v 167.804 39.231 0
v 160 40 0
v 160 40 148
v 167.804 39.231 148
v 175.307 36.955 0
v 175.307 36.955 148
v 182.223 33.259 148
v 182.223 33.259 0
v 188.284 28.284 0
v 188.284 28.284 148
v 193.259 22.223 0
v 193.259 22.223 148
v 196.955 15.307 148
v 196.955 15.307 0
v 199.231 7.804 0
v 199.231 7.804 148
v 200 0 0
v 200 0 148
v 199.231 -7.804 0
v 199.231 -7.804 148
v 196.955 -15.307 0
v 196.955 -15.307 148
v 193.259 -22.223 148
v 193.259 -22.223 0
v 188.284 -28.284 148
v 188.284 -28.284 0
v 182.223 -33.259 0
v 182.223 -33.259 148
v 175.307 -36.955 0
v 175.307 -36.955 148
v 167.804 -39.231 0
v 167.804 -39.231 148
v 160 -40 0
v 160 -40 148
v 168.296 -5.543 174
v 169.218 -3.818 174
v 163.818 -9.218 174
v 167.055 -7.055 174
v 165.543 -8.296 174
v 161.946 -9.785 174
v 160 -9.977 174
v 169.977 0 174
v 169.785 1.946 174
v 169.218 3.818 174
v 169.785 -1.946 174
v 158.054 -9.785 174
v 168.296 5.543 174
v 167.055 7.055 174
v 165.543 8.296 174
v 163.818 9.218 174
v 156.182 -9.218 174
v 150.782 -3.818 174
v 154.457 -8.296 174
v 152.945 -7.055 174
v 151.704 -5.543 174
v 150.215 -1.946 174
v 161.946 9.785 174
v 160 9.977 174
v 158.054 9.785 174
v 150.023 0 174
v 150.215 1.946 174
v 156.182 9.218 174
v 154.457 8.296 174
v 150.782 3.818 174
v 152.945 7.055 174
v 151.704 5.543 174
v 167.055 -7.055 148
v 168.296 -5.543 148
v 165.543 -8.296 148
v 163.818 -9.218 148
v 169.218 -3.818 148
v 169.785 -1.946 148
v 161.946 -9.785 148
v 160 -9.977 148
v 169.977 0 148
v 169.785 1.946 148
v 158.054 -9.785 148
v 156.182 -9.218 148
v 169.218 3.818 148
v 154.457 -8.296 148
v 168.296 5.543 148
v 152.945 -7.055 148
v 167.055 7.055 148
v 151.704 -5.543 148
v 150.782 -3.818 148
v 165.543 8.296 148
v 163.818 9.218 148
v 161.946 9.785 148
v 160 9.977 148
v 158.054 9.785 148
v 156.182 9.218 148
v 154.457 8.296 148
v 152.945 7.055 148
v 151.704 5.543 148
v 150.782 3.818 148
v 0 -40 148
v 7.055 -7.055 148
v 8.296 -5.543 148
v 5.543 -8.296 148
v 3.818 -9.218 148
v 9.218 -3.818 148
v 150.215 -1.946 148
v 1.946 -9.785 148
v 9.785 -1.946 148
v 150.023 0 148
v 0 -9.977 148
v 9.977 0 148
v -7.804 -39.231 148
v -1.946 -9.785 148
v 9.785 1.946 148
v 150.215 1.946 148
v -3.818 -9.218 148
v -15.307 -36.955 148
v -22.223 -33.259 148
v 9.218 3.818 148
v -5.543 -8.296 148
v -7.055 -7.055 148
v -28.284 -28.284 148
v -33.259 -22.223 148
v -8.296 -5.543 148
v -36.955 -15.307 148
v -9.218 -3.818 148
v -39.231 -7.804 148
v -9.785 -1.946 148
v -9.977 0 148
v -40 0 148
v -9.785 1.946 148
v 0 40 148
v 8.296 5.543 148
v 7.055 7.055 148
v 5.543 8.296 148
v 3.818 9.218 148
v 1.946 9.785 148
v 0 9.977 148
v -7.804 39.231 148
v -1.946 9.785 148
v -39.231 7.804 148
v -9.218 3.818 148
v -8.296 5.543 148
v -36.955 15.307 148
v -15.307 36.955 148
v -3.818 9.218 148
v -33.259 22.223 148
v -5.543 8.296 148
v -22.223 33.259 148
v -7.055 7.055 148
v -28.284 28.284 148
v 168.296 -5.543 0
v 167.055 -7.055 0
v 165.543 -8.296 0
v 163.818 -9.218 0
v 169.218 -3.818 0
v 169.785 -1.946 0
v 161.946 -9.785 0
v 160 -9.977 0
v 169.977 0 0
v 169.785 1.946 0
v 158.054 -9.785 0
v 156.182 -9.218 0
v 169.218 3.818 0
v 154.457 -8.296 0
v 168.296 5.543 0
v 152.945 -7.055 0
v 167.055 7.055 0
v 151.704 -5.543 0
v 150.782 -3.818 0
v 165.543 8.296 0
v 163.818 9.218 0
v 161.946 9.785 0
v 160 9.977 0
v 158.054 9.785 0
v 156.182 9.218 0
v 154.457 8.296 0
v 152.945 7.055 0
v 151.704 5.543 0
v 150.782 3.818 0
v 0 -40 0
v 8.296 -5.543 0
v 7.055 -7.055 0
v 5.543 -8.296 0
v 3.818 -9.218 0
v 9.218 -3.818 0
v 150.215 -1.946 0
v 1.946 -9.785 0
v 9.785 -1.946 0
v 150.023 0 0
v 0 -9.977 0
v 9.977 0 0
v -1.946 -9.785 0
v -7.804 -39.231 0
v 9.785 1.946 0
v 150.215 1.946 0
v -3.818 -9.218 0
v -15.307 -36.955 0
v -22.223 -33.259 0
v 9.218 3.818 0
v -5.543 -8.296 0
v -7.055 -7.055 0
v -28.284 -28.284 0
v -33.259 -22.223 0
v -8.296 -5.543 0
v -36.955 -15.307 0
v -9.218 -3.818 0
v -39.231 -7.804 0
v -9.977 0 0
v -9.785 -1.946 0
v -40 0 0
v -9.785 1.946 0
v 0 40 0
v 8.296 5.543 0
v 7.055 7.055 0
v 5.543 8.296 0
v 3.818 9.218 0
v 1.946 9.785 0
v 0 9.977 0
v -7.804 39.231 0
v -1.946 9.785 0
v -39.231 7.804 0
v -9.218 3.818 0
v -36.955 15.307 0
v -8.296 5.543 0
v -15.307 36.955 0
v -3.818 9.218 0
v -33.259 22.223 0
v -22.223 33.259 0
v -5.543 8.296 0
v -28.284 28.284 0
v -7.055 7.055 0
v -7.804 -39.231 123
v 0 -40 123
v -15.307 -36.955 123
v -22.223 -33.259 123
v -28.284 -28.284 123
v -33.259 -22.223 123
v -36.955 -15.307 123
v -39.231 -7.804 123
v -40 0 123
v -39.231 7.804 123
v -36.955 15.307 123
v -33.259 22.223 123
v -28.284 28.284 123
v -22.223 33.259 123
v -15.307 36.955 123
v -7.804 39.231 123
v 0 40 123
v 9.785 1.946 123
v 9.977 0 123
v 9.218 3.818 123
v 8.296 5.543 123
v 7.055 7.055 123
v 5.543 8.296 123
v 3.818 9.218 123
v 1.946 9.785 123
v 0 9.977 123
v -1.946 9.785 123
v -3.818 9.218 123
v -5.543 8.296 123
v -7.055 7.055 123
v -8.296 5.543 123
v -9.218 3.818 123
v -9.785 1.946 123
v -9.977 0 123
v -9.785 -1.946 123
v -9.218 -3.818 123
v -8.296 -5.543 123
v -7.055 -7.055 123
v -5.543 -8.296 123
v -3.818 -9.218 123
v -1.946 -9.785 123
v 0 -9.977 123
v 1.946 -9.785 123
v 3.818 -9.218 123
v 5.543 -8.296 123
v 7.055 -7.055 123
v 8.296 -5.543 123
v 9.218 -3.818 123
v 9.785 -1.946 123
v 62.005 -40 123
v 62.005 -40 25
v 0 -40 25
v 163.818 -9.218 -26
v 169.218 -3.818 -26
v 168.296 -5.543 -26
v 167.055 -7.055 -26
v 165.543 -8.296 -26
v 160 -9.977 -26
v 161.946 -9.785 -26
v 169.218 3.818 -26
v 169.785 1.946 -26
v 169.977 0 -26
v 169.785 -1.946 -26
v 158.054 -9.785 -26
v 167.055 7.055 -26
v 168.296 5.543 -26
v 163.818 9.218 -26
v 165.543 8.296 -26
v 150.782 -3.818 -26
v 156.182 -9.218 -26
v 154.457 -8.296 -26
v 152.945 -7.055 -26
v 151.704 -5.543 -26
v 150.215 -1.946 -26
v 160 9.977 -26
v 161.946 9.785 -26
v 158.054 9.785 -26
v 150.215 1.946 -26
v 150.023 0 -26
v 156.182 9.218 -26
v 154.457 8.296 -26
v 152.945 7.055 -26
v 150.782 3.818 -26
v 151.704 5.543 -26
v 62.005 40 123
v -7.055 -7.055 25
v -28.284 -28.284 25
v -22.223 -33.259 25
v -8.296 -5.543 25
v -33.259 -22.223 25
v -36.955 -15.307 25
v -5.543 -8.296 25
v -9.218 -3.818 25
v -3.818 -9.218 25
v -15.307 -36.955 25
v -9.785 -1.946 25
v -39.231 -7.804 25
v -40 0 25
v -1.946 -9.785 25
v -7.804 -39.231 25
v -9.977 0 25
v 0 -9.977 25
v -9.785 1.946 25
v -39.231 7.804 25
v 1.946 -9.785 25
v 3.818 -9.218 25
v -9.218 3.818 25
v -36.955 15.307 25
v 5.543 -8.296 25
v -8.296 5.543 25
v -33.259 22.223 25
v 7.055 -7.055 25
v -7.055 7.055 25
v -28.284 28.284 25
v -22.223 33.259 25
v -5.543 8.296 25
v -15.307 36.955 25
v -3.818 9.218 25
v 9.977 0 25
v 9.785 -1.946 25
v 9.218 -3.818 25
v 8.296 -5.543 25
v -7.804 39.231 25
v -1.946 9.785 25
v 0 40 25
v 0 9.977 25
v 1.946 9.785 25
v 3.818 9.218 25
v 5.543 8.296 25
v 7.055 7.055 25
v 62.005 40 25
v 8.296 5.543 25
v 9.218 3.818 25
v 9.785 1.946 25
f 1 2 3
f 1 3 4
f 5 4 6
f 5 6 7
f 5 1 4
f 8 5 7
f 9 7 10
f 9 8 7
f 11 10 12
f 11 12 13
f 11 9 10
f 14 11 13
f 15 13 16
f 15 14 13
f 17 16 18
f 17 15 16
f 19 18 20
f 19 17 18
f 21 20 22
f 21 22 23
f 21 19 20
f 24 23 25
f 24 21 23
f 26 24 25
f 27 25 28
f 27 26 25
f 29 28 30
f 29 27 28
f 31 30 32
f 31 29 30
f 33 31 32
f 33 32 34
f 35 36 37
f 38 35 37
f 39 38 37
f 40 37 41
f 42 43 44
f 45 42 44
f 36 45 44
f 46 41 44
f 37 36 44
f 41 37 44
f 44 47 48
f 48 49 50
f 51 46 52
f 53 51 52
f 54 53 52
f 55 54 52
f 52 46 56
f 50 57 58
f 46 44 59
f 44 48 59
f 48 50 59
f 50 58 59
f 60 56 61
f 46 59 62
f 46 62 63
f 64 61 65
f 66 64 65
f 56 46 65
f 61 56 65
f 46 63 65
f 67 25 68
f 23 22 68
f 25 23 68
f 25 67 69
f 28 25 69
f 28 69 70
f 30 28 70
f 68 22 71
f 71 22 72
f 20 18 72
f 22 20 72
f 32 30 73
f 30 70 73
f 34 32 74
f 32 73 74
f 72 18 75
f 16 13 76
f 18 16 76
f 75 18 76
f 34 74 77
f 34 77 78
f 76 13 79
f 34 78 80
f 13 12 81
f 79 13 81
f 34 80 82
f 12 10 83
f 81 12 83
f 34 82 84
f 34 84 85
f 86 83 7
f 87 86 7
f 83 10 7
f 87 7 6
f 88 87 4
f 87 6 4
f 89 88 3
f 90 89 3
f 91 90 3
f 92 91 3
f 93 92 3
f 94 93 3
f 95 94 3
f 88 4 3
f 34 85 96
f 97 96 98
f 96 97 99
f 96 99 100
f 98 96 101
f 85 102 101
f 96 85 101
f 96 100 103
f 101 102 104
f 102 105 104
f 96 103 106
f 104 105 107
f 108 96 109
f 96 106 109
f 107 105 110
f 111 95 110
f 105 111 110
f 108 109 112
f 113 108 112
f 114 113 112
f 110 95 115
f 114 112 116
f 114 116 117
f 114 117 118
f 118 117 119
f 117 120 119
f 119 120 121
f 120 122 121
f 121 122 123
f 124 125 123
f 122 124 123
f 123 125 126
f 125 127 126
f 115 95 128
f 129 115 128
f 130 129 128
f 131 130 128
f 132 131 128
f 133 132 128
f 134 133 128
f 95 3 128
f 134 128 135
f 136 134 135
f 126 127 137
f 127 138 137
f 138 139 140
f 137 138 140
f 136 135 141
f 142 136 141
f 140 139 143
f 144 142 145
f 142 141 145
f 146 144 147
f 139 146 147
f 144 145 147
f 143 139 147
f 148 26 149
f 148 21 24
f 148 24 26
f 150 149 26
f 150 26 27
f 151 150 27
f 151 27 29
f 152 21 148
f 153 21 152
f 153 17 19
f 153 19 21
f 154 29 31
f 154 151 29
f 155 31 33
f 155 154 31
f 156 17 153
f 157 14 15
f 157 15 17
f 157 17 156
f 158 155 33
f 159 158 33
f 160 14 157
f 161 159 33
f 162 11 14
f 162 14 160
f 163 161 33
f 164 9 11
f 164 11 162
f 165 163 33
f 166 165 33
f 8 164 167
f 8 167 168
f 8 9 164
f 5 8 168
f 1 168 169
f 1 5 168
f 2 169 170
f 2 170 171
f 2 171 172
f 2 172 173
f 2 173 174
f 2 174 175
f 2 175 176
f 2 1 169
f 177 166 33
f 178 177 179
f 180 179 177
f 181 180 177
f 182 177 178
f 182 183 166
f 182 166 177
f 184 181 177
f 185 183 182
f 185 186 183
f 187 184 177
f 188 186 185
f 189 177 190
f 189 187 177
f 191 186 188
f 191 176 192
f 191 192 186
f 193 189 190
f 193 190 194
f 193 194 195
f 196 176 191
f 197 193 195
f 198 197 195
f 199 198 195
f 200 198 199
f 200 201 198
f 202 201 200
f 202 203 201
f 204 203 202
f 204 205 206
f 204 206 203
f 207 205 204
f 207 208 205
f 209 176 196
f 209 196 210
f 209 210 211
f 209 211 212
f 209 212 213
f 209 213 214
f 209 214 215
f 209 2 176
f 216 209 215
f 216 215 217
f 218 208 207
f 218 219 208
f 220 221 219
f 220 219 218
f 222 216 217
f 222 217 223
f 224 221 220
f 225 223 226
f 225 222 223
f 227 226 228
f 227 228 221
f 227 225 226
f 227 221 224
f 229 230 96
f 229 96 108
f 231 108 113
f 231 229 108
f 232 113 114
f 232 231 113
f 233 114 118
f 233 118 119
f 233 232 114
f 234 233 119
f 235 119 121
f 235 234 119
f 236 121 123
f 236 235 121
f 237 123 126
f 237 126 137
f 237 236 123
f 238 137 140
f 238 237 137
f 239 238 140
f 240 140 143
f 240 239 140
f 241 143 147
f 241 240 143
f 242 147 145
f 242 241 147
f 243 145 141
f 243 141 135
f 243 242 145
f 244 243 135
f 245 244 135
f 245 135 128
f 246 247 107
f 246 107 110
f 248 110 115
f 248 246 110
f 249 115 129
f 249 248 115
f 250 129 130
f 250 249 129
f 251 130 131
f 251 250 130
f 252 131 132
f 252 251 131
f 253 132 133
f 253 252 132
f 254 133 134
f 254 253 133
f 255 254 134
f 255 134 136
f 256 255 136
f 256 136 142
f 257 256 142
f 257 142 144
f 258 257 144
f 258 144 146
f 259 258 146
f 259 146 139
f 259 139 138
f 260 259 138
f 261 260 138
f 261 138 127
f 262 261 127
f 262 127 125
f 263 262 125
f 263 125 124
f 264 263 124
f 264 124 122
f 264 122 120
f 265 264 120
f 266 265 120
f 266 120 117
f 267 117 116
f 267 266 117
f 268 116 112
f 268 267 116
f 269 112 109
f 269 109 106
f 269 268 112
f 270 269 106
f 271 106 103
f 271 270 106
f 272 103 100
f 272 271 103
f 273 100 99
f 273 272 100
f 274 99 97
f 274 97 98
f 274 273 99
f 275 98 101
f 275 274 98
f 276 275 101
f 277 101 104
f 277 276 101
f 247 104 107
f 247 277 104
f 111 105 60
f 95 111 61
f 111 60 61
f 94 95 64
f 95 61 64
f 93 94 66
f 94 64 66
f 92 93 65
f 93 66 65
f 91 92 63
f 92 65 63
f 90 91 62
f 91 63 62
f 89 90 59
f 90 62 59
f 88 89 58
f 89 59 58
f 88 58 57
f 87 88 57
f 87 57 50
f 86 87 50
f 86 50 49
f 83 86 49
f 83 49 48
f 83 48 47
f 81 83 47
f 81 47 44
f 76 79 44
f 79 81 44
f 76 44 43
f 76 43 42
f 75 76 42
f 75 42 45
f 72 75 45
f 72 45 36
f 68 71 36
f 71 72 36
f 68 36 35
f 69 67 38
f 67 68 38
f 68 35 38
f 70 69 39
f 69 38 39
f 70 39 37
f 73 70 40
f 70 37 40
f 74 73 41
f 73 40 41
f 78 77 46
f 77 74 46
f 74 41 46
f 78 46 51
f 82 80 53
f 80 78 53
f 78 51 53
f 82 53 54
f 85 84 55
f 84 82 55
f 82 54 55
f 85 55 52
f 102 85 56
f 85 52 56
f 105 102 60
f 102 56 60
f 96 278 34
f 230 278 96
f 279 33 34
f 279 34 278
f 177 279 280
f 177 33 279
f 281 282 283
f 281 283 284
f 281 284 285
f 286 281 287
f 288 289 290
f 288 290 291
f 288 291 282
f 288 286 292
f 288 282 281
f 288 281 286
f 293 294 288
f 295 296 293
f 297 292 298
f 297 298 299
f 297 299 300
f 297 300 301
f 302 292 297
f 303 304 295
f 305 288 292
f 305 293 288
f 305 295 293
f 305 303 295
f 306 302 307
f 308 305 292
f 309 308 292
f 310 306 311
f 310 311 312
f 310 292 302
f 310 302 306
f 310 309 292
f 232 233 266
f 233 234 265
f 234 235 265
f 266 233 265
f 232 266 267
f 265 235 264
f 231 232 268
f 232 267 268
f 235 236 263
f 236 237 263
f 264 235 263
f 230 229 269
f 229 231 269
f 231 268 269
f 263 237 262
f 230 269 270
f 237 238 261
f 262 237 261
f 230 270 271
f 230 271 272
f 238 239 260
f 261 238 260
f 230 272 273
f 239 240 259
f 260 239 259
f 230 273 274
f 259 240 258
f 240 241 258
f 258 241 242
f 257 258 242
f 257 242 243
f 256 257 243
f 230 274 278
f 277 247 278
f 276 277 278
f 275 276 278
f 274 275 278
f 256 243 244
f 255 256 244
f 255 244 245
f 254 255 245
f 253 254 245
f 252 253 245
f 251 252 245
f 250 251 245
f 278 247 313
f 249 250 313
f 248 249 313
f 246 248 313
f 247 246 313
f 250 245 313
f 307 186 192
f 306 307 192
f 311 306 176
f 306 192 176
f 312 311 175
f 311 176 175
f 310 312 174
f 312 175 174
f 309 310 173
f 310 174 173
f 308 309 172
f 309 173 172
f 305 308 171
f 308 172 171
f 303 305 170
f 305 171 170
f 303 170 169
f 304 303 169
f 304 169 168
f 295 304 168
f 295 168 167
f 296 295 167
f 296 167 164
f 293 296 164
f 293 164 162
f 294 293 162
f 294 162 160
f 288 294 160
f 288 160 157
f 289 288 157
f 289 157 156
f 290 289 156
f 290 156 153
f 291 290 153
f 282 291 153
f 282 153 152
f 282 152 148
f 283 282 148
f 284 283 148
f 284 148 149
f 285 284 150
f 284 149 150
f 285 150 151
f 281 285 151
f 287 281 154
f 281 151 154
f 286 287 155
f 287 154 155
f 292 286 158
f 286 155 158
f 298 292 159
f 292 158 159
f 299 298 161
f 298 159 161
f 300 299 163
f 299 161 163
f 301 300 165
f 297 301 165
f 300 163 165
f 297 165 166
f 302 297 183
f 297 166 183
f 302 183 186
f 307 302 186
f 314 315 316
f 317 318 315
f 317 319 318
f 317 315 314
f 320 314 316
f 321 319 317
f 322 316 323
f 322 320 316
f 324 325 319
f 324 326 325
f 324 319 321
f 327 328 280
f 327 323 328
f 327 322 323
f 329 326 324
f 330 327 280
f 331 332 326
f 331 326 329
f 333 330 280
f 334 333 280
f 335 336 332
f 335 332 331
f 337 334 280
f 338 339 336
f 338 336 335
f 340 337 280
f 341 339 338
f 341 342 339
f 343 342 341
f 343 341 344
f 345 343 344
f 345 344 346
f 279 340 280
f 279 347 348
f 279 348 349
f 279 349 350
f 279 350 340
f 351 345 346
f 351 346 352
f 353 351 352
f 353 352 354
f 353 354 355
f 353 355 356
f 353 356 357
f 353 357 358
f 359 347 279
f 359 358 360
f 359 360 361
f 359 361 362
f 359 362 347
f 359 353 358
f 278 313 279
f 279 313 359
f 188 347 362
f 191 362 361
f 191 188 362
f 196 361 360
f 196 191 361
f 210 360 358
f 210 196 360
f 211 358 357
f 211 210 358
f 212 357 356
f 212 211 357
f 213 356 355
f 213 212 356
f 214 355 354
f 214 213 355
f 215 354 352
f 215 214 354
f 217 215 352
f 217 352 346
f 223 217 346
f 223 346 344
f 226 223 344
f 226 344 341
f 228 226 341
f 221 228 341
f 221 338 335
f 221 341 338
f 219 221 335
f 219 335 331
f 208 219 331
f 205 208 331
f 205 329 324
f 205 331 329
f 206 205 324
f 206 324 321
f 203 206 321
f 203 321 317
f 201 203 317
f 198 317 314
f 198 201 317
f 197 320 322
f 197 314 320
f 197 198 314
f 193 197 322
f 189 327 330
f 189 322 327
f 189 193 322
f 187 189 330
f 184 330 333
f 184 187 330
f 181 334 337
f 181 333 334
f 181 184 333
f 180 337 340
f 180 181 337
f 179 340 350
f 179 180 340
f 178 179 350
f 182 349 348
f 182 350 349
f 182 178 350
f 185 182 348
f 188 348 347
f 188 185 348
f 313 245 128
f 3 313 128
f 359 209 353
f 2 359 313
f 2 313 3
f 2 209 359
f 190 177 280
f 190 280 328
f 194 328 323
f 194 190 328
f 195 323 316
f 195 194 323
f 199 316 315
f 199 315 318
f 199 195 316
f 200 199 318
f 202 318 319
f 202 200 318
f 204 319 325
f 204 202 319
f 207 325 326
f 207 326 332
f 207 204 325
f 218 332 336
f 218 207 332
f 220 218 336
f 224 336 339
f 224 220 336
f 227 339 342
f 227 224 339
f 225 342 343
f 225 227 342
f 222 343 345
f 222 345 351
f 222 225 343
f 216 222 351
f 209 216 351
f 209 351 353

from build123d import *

# Parameters (mm, degrees)
CROQUIS1_R                    = 9.977
SALIENTE_EXTRUIR9_DEPTH       = 148
SALIENTE_EXTRUIR10_DEPTH      = 26
SALIENTE_EXTRUIR10_DEPTH_BACK = 174
CROQUIS8_R                    = 9.977
CROQUIS9_W                    = 114.38894851
CROQUIS9_H                    = 98
CORTAR_EXTRUIR2_DEPTH         = 131


with BuildPart() as part:
    # Croquis1 → Saliente-Extruir9 (new body)
    with BuildSketch(Plane.XY):
        with BuildLine():
            Line((0, 40), (160, 40))
            ThreePointArc((160, 40), (200, 0), (160, -40))
            Line((160, -40), (0, -40))
            ThreePointArc((0, -40), (-40, 0), (0, 40))
        make_face()
        Circle(CROQUIS1_R, mode=Mode.SUBTRACT)
    extrude(amount=SALIENTE_EXTRUIR9_DEPTH)

    # Croquis8 → Saliente-Extruir10 (add, two sides: drawn at the far end of the back side and taken through both)
    with BuildSketch(Plane(origin=(0, 0, 0), x_dir=(-1, 0, 0), z_dir=(0, 0, -1)).offset(-SALIENTE_EXTRUIR10_DEPTH_BACK)):
        with Locations((-160, 0)):
            Circle(CROQUIS8_R)
    extrude(amount=SALIENTE_EXTRUIR10_DEPTH + SALIENTE_EXTRUIR10_DEPTH_BACK)

    # Croquis9 → Cortar-Extruir2 (cut)
    with BuildSketch(Plane(origin=(0, 40, 0), x_dir=(1, 0, 0), z_dir=(0, 1, 0))):
        with Locations((4.810807807, -74)):
            Rectangle(CROQUIS9_W, CROQUIS9_H)
    extrude(amount=-CORTAR_EXTRUIR2_DEPTH, mode=Mode.SUBTRACT)


solid = part.part
